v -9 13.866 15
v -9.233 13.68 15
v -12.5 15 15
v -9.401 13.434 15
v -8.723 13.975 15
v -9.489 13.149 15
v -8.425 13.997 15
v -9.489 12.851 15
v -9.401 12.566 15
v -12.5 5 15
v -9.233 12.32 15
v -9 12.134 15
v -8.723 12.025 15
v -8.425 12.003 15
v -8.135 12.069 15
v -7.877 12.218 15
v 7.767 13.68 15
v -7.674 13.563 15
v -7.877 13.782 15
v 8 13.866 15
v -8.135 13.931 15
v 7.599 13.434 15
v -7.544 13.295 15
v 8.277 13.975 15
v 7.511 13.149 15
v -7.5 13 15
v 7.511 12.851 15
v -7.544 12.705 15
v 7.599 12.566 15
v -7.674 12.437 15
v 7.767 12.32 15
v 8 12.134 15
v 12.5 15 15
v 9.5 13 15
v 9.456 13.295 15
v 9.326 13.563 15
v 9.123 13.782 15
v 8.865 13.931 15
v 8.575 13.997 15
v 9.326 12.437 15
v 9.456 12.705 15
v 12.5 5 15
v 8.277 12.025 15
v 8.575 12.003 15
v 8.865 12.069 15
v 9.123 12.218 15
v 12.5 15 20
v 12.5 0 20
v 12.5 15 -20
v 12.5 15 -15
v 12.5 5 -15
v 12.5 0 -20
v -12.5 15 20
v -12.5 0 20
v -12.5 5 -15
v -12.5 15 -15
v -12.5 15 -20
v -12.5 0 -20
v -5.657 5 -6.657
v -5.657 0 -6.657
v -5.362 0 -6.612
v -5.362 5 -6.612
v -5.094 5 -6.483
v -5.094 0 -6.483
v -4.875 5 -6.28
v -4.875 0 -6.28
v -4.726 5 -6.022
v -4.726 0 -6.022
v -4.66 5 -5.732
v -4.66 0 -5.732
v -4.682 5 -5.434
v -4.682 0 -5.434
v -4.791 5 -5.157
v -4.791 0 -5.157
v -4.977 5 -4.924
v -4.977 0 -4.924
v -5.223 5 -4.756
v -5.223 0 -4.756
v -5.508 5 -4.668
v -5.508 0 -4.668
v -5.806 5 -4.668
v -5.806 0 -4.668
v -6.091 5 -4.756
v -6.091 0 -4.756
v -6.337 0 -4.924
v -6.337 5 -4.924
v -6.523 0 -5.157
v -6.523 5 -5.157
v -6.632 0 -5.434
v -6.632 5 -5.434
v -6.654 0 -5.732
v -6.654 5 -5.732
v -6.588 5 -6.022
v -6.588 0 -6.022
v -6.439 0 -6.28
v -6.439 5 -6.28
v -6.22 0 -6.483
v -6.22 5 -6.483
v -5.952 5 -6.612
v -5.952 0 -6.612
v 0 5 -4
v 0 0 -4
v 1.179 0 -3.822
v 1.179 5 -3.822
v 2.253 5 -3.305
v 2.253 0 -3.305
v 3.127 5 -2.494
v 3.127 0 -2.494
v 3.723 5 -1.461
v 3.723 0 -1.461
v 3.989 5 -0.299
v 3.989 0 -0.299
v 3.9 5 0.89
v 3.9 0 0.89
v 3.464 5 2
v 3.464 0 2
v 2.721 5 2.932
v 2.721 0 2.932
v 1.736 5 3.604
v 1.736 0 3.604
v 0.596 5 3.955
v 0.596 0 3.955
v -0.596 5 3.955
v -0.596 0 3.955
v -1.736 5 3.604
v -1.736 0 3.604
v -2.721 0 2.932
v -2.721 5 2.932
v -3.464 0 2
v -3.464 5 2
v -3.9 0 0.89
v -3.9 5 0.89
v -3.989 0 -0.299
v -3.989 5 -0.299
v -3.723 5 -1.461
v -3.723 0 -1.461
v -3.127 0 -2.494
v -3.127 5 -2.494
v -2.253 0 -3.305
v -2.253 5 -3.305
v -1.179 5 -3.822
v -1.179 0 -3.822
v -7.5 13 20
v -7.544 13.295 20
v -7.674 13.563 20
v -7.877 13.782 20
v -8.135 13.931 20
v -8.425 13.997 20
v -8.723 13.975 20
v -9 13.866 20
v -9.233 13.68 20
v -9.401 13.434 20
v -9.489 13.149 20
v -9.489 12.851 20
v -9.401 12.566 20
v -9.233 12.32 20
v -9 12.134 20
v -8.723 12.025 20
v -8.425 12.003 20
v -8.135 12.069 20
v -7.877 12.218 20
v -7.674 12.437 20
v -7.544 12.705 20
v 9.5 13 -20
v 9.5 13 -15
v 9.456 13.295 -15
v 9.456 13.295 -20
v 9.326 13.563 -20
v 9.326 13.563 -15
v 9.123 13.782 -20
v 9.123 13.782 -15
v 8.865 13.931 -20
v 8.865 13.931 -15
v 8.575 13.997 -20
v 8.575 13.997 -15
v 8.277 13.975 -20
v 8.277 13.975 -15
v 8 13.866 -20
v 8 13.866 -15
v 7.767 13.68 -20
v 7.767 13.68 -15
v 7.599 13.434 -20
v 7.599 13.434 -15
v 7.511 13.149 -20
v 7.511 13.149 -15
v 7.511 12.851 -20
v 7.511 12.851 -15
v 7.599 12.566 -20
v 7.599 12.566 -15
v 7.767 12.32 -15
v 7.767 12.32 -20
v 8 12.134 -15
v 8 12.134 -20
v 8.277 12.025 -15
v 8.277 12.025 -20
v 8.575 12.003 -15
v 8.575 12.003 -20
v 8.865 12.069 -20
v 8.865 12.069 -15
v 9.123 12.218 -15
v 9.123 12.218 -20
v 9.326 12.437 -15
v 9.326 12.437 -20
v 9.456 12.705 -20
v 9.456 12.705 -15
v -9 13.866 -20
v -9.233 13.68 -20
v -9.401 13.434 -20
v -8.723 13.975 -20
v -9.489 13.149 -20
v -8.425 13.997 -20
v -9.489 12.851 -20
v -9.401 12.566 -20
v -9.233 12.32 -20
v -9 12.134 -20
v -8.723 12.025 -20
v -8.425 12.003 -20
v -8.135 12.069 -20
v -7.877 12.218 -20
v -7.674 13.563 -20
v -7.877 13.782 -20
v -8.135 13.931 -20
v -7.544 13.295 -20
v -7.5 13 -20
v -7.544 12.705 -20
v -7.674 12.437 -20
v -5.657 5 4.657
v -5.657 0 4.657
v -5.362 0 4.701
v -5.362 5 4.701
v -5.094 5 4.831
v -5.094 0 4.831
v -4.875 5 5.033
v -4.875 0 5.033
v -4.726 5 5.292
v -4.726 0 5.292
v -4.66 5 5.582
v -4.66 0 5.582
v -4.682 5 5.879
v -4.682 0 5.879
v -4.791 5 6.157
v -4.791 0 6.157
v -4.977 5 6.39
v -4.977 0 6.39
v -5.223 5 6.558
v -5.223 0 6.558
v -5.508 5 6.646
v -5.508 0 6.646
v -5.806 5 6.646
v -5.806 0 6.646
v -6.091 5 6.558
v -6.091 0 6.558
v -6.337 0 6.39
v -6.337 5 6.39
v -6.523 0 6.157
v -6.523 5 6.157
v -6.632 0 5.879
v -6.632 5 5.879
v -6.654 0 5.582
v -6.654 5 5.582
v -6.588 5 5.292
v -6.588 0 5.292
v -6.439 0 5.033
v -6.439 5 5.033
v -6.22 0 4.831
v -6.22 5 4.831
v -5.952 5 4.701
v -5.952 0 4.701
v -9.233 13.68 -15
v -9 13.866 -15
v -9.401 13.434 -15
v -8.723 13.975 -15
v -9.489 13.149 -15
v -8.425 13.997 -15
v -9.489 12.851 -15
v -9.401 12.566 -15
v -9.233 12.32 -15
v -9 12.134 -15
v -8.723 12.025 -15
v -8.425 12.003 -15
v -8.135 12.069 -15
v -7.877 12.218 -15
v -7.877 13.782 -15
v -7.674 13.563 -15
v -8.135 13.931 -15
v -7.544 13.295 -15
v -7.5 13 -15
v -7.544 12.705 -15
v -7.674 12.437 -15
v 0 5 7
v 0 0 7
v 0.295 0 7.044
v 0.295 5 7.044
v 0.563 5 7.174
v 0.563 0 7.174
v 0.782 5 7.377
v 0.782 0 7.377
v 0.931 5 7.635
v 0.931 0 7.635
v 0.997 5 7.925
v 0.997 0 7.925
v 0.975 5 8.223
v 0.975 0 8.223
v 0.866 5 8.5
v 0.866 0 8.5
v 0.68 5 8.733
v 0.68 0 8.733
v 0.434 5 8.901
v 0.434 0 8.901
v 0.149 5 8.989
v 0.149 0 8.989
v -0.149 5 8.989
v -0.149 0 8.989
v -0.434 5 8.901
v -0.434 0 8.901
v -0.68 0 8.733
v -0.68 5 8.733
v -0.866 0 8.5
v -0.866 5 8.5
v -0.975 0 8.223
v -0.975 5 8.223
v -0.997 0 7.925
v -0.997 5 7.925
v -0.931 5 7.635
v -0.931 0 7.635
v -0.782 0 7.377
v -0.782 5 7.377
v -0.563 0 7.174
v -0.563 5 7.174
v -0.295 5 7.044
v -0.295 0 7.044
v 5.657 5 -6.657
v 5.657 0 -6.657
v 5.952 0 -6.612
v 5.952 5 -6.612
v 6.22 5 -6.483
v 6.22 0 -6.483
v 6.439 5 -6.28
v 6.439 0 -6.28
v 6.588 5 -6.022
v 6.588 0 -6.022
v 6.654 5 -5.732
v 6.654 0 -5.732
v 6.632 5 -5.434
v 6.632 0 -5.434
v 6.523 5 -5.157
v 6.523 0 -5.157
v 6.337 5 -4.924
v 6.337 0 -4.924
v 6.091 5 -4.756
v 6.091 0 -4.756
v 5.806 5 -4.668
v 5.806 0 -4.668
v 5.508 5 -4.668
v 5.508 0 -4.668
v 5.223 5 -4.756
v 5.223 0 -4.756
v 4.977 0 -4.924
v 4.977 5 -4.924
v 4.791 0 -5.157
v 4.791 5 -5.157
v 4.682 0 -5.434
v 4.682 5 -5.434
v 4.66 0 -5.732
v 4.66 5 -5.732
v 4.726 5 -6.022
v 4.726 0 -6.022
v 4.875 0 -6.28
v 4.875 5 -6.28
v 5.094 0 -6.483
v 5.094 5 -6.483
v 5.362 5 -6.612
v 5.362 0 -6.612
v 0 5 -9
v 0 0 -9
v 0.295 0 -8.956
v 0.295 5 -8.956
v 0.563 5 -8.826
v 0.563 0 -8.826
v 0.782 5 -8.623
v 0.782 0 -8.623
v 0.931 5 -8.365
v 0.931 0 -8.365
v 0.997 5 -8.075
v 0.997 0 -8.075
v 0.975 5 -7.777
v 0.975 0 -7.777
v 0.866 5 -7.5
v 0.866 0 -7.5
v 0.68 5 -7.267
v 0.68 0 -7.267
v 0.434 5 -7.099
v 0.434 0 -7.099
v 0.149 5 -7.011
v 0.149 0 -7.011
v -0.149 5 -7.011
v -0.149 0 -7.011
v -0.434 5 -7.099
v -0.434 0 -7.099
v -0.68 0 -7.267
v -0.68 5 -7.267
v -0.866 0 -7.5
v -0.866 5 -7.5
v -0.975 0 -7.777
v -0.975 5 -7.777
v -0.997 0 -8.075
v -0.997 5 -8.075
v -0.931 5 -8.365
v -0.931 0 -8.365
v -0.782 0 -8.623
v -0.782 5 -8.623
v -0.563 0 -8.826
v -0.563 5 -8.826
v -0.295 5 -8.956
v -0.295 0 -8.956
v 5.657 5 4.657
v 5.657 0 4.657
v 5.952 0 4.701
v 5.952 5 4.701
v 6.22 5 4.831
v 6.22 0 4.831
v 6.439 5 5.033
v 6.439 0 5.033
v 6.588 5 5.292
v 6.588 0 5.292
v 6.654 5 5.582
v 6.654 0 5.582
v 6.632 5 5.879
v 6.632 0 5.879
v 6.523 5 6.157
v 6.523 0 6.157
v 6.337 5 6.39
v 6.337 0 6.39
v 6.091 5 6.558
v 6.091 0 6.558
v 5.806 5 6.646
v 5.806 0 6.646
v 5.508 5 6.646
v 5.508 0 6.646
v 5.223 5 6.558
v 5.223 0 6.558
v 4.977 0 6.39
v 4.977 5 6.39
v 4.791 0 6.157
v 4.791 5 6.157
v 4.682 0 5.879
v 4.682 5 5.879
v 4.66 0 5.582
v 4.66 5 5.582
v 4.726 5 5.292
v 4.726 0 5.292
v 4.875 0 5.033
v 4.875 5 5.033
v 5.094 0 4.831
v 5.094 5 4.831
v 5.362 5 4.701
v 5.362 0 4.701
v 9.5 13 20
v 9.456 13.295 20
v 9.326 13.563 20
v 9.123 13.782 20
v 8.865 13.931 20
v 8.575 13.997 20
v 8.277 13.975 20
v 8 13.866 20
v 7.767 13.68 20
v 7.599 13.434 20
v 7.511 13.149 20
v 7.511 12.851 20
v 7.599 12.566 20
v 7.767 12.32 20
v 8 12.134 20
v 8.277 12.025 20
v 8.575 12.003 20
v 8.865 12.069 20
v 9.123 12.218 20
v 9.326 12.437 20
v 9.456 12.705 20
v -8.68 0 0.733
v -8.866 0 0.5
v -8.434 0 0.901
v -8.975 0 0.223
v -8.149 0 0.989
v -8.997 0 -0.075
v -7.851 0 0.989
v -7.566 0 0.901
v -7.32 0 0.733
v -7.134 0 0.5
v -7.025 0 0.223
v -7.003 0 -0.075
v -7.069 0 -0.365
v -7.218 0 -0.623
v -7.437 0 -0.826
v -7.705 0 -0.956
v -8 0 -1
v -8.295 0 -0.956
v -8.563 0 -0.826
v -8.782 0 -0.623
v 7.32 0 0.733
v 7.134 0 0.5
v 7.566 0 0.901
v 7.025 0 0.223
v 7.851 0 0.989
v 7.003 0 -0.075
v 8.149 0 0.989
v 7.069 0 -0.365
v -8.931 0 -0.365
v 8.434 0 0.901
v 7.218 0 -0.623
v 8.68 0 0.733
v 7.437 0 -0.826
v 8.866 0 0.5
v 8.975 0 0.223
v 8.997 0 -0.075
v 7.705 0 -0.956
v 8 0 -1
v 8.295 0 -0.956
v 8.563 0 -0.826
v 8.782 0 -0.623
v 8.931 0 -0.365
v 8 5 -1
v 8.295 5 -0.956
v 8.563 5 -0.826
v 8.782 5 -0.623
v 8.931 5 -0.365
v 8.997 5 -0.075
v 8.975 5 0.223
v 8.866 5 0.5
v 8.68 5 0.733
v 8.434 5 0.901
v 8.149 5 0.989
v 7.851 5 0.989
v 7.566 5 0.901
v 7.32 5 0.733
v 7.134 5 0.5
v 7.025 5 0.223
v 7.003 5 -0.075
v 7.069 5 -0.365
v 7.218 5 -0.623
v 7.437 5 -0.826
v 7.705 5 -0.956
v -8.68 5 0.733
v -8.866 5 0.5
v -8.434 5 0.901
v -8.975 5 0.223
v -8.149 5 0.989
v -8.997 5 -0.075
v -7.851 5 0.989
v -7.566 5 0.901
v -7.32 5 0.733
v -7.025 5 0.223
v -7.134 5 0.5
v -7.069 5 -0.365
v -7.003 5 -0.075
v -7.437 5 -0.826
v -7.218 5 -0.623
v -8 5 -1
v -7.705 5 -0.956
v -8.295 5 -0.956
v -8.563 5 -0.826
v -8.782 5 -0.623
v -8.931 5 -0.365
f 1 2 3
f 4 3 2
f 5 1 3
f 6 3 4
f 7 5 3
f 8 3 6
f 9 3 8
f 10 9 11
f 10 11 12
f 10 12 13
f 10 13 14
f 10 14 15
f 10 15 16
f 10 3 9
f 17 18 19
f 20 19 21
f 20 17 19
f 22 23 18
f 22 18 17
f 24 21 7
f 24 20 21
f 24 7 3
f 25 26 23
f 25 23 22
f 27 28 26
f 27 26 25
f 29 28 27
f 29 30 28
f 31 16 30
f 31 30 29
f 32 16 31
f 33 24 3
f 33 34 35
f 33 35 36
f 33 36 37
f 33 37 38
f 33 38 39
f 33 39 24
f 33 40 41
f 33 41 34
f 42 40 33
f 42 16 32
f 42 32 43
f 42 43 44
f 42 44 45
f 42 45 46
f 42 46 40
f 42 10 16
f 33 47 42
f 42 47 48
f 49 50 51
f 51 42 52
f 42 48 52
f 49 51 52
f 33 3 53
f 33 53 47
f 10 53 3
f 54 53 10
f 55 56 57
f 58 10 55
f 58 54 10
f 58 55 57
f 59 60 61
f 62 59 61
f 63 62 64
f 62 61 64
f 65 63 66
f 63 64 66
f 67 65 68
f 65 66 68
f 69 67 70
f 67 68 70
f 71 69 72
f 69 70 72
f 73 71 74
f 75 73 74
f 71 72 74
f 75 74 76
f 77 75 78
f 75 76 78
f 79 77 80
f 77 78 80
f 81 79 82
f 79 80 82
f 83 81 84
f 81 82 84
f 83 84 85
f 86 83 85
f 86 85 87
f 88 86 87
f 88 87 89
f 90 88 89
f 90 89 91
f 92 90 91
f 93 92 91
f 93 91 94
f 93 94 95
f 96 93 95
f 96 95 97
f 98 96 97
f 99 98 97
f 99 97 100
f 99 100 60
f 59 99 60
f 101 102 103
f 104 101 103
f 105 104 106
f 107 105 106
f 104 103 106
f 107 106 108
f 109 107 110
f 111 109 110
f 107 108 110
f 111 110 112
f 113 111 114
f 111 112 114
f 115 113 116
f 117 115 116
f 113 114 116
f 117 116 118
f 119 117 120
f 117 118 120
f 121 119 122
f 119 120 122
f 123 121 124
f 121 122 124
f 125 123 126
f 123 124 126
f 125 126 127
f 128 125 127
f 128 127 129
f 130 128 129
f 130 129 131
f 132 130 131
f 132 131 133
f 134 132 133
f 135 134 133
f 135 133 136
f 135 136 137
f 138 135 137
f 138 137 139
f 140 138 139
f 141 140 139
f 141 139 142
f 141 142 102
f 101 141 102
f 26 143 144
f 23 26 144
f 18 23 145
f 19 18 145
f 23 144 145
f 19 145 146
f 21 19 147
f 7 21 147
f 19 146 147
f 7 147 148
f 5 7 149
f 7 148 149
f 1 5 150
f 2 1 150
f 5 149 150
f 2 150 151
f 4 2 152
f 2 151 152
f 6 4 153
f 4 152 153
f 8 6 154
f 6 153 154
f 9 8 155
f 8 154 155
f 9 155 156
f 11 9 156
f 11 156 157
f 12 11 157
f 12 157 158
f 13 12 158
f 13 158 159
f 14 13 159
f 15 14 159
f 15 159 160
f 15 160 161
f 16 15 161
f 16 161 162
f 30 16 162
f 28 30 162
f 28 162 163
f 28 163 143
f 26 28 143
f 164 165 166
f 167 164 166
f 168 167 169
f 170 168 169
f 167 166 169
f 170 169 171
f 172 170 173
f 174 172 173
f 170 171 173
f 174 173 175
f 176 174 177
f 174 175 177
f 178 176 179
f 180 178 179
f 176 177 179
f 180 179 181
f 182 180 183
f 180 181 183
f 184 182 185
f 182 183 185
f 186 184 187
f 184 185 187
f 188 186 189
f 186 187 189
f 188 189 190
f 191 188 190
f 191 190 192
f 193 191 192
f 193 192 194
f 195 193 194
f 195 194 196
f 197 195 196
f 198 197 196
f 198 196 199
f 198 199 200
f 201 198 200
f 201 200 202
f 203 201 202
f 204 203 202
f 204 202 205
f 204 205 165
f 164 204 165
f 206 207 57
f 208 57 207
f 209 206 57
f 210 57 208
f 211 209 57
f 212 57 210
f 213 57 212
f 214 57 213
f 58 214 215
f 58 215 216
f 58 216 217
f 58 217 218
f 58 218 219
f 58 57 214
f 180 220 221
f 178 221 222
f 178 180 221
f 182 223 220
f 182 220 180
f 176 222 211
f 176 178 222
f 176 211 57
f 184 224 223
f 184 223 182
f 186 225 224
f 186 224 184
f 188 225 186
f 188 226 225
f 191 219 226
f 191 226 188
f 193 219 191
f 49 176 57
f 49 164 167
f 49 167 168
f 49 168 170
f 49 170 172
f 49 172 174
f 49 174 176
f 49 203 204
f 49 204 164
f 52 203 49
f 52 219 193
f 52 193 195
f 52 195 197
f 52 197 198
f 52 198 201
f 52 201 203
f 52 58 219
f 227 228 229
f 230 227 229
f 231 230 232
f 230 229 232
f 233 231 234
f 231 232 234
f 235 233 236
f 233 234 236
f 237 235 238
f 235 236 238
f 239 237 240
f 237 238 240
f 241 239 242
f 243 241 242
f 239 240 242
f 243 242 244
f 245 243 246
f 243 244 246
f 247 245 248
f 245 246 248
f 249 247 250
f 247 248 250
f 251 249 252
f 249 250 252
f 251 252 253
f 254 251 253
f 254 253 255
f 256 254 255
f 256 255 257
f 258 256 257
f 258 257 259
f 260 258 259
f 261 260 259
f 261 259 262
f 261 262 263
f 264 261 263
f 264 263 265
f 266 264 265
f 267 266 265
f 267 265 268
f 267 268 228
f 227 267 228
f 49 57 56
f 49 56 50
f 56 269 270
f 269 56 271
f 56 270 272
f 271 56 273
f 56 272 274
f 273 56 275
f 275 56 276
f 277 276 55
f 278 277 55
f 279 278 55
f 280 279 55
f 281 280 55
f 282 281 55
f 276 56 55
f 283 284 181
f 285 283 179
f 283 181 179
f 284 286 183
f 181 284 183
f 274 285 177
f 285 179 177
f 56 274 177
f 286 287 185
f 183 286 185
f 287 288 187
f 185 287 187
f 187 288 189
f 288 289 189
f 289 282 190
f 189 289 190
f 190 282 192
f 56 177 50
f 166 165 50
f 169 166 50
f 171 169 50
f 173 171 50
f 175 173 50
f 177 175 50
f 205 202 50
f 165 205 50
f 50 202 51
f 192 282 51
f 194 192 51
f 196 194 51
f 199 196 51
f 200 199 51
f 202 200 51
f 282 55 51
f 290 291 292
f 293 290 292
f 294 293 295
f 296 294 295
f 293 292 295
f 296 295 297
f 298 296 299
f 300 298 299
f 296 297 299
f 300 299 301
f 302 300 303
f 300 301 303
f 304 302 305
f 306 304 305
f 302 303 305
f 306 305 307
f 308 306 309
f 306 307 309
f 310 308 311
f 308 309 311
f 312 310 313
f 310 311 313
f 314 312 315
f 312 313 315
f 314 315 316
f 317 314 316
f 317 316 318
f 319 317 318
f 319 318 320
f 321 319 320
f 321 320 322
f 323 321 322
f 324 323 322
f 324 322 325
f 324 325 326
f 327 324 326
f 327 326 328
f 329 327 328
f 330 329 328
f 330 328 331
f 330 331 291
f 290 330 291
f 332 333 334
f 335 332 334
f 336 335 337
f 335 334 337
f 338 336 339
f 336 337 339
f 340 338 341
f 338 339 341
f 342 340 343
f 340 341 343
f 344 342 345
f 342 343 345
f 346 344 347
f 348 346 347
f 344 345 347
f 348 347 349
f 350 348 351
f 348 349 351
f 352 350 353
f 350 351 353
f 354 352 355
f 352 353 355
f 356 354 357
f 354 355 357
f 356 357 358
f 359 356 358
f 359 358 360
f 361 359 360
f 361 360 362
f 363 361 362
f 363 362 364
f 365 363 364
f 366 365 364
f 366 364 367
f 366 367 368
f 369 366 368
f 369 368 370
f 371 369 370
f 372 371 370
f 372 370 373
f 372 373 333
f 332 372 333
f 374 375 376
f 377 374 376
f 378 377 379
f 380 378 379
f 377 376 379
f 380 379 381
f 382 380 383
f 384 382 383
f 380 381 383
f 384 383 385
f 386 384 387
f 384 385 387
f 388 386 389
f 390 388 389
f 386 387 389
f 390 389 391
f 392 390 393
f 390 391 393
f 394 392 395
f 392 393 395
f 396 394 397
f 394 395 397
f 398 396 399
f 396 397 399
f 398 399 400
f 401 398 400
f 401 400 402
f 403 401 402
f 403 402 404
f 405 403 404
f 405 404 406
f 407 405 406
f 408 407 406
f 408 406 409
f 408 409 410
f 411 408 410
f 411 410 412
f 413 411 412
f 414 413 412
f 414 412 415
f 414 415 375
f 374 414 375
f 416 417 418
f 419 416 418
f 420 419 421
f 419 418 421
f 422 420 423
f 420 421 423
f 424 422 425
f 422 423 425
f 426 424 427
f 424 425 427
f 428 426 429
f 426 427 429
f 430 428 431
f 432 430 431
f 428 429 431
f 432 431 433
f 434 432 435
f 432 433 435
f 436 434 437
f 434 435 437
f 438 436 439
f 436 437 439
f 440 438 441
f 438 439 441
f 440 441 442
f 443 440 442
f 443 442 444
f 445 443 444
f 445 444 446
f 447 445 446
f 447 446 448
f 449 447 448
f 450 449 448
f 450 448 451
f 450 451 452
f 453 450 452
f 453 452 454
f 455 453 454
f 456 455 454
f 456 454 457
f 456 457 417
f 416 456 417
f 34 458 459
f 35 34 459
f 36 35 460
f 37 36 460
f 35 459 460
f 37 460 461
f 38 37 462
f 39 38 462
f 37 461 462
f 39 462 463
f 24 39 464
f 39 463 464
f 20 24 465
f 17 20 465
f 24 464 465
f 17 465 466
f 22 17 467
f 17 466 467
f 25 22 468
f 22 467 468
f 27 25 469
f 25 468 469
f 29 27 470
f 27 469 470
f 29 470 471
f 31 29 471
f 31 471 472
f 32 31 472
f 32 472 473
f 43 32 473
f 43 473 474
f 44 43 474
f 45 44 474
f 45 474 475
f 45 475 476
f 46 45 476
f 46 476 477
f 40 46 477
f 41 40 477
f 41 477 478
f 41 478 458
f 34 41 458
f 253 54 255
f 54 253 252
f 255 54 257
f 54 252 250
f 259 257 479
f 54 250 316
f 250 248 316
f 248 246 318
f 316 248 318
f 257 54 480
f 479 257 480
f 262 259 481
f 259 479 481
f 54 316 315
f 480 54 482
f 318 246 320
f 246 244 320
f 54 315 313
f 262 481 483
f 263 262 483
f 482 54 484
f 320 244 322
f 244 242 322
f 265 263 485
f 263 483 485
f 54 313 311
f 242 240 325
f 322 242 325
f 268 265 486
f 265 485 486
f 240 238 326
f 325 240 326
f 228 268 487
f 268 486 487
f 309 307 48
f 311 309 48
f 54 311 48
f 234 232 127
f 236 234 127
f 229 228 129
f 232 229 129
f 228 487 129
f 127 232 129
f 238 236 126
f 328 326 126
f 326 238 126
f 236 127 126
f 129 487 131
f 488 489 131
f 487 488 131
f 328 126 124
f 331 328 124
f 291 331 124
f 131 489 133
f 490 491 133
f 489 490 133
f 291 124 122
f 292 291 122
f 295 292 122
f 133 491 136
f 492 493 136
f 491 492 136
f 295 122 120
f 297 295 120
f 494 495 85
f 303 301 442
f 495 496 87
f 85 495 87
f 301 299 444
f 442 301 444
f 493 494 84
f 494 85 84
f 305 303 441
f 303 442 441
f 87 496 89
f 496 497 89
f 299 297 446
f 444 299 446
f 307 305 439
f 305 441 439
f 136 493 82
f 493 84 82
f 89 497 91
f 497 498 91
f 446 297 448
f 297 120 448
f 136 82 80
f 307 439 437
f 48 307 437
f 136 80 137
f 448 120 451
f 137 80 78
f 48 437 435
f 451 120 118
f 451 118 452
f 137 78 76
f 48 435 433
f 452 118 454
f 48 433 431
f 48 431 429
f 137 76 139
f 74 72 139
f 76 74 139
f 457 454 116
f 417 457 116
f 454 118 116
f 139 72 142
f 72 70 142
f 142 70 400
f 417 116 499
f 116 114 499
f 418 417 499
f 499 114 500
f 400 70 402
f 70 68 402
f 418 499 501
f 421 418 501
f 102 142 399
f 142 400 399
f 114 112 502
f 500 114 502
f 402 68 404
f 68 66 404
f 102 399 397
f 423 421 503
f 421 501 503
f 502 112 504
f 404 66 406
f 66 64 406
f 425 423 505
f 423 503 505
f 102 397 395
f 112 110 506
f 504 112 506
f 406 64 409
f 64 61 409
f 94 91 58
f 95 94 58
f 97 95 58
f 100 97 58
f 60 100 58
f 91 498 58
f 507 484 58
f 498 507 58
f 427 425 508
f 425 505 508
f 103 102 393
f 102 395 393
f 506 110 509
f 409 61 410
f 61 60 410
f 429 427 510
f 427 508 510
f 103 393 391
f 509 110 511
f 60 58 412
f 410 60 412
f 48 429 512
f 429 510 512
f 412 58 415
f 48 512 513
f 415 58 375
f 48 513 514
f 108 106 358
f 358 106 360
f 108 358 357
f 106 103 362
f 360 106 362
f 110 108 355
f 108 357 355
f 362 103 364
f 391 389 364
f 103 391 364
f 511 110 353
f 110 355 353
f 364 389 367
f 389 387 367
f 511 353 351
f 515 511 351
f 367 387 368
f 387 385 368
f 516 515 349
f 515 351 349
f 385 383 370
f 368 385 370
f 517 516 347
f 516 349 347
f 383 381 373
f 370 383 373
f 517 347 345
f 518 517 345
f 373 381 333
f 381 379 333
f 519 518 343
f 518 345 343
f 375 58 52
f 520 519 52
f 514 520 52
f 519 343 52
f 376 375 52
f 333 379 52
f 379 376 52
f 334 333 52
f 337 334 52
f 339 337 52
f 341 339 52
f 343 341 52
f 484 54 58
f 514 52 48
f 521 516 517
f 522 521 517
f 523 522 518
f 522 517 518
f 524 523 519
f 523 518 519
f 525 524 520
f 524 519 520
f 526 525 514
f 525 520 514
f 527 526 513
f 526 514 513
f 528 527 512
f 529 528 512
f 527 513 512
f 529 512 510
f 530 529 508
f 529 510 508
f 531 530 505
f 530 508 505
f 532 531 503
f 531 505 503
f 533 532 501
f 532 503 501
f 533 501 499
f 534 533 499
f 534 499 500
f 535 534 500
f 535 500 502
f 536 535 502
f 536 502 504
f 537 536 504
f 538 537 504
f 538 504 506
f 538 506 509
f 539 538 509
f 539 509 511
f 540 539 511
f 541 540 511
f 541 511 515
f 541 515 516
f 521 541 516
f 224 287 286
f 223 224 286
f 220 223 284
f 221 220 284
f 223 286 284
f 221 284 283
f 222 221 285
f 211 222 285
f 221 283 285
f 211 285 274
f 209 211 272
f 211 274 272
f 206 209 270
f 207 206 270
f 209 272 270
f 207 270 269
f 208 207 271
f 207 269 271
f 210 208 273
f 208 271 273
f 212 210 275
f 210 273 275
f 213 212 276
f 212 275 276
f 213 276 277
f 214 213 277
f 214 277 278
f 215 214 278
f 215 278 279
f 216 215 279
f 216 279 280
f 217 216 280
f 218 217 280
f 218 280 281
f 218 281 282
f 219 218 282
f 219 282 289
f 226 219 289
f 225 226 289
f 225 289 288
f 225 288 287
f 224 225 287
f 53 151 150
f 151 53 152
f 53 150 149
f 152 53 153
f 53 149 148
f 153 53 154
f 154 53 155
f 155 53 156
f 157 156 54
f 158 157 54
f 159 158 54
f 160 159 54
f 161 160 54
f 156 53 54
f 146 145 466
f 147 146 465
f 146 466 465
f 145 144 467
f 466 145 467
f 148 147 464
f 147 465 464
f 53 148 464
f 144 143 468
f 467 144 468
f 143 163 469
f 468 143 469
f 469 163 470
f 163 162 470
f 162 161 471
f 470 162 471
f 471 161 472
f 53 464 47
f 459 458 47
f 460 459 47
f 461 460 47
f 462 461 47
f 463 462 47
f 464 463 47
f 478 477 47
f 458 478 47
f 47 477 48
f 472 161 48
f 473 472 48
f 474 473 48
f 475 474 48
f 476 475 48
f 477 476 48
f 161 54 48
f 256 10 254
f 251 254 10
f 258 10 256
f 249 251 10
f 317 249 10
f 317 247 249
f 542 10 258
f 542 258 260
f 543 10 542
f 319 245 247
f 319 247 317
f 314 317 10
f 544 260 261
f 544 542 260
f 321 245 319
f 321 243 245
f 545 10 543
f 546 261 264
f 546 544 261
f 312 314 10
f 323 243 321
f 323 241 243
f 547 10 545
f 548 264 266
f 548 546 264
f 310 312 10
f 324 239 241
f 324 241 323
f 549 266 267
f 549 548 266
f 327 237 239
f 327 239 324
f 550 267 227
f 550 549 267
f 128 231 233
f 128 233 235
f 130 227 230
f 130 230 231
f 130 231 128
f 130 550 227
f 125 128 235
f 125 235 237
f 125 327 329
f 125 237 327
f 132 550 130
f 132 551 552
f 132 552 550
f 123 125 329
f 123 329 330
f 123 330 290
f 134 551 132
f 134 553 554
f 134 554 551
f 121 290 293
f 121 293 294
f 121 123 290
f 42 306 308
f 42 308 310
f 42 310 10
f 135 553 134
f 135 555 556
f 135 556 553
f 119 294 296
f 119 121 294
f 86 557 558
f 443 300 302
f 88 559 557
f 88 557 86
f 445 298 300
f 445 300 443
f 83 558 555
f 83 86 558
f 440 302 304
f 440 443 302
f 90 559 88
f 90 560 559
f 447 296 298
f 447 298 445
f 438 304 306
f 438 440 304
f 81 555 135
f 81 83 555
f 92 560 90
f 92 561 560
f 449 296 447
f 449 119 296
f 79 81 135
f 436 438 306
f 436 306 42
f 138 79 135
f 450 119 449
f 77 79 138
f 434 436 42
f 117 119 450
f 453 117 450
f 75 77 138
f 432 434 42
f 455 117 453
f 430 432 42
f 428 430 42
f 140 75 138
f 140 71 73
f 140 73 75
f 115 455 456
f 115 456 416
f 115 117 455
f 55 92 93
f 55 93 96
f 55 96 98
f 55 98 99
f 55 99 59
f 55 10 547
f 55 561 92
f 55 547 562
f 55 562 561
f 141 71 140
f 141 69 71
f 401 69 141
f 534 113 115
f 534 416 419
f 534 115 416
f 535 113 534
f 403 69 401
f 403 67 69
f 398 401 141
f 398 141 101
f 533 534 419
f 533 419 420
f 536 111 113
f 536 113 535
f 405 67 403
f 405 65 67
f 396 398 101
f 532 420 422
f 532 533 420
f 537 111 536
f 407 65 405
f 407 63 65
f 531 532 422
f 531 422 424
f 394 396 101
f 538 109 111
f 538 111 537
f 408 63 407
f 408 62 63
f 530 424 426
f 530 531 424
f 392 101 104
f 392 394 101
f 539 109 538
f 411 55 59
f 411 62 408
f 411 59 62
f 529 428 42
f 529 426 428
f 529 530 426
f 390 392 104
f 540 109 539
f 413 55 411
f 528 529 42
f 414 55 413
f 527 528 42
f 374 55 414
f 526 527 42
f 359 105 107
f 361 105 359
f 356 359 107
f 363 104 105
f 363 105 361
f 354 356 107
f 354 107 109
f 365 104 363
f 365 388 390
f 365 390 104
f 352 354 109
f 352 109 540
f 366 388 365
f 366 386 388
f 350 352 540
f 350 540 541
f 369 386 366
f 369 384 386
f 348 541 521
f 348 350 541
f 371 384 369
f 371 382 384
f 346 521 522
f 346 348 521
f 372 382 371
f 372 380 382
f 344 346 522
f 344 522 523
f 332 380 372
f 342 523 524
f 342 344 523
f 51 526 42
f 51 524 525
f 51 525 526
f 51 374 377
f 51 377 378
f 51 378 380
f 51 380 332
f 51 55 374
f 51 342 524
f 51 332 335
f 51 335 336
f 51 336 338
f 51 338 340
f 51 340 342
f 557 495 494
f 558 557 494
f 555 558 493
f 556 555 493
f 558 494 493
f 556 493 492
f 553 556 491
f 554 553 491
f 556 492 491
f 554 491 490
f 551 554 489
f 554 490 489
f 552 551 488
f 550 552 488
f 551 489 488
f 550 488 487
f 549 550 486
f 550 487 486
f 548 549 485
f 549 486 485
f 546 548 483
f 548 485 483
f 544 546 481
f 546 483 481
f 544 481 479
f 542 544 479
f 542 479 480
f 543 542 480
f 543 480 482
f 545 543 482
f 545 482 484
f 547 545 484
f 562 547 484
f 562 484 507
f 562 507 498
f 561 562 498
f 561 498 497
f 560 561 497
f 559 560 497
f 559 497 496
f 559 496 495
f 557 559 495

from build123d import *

# Parameters (mm, degrees)
SKETCH1_W           = 25
SKETCH1_H           = 40
BOSS_EXTRUDE1_DEPTH = 5
SKETCH5_W           = 25
SKETCH5_H           = 5
BOSS_EXTRUDE2_DEPTH = 10
SKETCH6_R           = 1
CUT_EXTRUDE3_DEPTH  = 45.511234537
SKETCH7_R           = 4
SKETCH7_R_2         = 1
CUT_EXTRUDE4_DEPTH  = 10


with BuildPart() as part:
    # Sketch1 → Boss-Extrude1 (new body)
    with BuildSketch(Plane(origin=(0, 0, 0), x_dir=(1, 0, 0), z_dir=(0, 1, 0))):
        Rectangle(SKETCH1_W, SKETCH1_H)
    extrude(amount=BOSS_EXTRUDE1_DEPTH)

    # Sketch5 → Boss-Extrude2 (add)
    with BuildSketch(Plane(origin=(0, 5, 0), x_dir=(1, 0, 0), z_dir=(0, 1, 0))):
        with Locations((0, 17.5)):
            Rectangle(SKETCH5_W, SKETCH5_H)
        with Locations((0, -17.5)):
            Rectangle(SKETCH5_W, SKETCH5_H)
    extrude(amount=BOSS_EXTRUDE2_DEPTH)

    # Sketch6 → Cut-Extrude3 (cut, through all)
    with BuildSketch(Plane.XY.offset(20)):
        with Locations((-8.5, 13)):
            Circle(SKETCH6_R)
        with Locations((8.5, 13)):
            Circle(SKETCH6_R)
    extrude(amount=-CUT_EXTRUDE3_DEPTH, mode=Mode.SUBTRACT)

    # Sketch7 → Cut-Extrude4 (cut)
    with BuildSketch(Plane.XZ):
        with Locations(Location((0, 0, 0), (0, 0, 270))):
            Circle(SKETCH7_R)
        with Locations(Location((0, 8, 0), (0, 0, 270))):
            Circle(SKETCH7_R_2)
        with Locations(Location((5.656854249, 5.656854249, 0), (0, 0, 270))):
            Circle(SKETCH7_R_2)
        with Locations(Location((8, 0, 0), (0, 0, 270))):
            Circle(SKETCH7_R_2)
        with Locations(Location((5.656854249, -5.656854249, 0), (0, 0, 270))):
            Circle(SKETCH7_R_2)
        with Locations(Location((0, -8, 0), (0, 0, 270))):
            Circle(SKETCH7_R_2)
        with Locations(Location((-5.656854249, -5.656854249, 0), (0, 0, 270))):
            Circle(SKETCH7_R_2)
        with Locations(Location((-8, 0, 0), (0, 0, 270))):
            Circle(SKETCH7_R_2)
        with Locations(Location((-5.656854249, 5.656854249, 0), (0, 0, 270))):
            Circle(SKETCH7_R_2)
    extrude(amount=-CUT_EXTRUDE4_DEPTH, mode=Mode.SUBTRACT)


solid = part.part
